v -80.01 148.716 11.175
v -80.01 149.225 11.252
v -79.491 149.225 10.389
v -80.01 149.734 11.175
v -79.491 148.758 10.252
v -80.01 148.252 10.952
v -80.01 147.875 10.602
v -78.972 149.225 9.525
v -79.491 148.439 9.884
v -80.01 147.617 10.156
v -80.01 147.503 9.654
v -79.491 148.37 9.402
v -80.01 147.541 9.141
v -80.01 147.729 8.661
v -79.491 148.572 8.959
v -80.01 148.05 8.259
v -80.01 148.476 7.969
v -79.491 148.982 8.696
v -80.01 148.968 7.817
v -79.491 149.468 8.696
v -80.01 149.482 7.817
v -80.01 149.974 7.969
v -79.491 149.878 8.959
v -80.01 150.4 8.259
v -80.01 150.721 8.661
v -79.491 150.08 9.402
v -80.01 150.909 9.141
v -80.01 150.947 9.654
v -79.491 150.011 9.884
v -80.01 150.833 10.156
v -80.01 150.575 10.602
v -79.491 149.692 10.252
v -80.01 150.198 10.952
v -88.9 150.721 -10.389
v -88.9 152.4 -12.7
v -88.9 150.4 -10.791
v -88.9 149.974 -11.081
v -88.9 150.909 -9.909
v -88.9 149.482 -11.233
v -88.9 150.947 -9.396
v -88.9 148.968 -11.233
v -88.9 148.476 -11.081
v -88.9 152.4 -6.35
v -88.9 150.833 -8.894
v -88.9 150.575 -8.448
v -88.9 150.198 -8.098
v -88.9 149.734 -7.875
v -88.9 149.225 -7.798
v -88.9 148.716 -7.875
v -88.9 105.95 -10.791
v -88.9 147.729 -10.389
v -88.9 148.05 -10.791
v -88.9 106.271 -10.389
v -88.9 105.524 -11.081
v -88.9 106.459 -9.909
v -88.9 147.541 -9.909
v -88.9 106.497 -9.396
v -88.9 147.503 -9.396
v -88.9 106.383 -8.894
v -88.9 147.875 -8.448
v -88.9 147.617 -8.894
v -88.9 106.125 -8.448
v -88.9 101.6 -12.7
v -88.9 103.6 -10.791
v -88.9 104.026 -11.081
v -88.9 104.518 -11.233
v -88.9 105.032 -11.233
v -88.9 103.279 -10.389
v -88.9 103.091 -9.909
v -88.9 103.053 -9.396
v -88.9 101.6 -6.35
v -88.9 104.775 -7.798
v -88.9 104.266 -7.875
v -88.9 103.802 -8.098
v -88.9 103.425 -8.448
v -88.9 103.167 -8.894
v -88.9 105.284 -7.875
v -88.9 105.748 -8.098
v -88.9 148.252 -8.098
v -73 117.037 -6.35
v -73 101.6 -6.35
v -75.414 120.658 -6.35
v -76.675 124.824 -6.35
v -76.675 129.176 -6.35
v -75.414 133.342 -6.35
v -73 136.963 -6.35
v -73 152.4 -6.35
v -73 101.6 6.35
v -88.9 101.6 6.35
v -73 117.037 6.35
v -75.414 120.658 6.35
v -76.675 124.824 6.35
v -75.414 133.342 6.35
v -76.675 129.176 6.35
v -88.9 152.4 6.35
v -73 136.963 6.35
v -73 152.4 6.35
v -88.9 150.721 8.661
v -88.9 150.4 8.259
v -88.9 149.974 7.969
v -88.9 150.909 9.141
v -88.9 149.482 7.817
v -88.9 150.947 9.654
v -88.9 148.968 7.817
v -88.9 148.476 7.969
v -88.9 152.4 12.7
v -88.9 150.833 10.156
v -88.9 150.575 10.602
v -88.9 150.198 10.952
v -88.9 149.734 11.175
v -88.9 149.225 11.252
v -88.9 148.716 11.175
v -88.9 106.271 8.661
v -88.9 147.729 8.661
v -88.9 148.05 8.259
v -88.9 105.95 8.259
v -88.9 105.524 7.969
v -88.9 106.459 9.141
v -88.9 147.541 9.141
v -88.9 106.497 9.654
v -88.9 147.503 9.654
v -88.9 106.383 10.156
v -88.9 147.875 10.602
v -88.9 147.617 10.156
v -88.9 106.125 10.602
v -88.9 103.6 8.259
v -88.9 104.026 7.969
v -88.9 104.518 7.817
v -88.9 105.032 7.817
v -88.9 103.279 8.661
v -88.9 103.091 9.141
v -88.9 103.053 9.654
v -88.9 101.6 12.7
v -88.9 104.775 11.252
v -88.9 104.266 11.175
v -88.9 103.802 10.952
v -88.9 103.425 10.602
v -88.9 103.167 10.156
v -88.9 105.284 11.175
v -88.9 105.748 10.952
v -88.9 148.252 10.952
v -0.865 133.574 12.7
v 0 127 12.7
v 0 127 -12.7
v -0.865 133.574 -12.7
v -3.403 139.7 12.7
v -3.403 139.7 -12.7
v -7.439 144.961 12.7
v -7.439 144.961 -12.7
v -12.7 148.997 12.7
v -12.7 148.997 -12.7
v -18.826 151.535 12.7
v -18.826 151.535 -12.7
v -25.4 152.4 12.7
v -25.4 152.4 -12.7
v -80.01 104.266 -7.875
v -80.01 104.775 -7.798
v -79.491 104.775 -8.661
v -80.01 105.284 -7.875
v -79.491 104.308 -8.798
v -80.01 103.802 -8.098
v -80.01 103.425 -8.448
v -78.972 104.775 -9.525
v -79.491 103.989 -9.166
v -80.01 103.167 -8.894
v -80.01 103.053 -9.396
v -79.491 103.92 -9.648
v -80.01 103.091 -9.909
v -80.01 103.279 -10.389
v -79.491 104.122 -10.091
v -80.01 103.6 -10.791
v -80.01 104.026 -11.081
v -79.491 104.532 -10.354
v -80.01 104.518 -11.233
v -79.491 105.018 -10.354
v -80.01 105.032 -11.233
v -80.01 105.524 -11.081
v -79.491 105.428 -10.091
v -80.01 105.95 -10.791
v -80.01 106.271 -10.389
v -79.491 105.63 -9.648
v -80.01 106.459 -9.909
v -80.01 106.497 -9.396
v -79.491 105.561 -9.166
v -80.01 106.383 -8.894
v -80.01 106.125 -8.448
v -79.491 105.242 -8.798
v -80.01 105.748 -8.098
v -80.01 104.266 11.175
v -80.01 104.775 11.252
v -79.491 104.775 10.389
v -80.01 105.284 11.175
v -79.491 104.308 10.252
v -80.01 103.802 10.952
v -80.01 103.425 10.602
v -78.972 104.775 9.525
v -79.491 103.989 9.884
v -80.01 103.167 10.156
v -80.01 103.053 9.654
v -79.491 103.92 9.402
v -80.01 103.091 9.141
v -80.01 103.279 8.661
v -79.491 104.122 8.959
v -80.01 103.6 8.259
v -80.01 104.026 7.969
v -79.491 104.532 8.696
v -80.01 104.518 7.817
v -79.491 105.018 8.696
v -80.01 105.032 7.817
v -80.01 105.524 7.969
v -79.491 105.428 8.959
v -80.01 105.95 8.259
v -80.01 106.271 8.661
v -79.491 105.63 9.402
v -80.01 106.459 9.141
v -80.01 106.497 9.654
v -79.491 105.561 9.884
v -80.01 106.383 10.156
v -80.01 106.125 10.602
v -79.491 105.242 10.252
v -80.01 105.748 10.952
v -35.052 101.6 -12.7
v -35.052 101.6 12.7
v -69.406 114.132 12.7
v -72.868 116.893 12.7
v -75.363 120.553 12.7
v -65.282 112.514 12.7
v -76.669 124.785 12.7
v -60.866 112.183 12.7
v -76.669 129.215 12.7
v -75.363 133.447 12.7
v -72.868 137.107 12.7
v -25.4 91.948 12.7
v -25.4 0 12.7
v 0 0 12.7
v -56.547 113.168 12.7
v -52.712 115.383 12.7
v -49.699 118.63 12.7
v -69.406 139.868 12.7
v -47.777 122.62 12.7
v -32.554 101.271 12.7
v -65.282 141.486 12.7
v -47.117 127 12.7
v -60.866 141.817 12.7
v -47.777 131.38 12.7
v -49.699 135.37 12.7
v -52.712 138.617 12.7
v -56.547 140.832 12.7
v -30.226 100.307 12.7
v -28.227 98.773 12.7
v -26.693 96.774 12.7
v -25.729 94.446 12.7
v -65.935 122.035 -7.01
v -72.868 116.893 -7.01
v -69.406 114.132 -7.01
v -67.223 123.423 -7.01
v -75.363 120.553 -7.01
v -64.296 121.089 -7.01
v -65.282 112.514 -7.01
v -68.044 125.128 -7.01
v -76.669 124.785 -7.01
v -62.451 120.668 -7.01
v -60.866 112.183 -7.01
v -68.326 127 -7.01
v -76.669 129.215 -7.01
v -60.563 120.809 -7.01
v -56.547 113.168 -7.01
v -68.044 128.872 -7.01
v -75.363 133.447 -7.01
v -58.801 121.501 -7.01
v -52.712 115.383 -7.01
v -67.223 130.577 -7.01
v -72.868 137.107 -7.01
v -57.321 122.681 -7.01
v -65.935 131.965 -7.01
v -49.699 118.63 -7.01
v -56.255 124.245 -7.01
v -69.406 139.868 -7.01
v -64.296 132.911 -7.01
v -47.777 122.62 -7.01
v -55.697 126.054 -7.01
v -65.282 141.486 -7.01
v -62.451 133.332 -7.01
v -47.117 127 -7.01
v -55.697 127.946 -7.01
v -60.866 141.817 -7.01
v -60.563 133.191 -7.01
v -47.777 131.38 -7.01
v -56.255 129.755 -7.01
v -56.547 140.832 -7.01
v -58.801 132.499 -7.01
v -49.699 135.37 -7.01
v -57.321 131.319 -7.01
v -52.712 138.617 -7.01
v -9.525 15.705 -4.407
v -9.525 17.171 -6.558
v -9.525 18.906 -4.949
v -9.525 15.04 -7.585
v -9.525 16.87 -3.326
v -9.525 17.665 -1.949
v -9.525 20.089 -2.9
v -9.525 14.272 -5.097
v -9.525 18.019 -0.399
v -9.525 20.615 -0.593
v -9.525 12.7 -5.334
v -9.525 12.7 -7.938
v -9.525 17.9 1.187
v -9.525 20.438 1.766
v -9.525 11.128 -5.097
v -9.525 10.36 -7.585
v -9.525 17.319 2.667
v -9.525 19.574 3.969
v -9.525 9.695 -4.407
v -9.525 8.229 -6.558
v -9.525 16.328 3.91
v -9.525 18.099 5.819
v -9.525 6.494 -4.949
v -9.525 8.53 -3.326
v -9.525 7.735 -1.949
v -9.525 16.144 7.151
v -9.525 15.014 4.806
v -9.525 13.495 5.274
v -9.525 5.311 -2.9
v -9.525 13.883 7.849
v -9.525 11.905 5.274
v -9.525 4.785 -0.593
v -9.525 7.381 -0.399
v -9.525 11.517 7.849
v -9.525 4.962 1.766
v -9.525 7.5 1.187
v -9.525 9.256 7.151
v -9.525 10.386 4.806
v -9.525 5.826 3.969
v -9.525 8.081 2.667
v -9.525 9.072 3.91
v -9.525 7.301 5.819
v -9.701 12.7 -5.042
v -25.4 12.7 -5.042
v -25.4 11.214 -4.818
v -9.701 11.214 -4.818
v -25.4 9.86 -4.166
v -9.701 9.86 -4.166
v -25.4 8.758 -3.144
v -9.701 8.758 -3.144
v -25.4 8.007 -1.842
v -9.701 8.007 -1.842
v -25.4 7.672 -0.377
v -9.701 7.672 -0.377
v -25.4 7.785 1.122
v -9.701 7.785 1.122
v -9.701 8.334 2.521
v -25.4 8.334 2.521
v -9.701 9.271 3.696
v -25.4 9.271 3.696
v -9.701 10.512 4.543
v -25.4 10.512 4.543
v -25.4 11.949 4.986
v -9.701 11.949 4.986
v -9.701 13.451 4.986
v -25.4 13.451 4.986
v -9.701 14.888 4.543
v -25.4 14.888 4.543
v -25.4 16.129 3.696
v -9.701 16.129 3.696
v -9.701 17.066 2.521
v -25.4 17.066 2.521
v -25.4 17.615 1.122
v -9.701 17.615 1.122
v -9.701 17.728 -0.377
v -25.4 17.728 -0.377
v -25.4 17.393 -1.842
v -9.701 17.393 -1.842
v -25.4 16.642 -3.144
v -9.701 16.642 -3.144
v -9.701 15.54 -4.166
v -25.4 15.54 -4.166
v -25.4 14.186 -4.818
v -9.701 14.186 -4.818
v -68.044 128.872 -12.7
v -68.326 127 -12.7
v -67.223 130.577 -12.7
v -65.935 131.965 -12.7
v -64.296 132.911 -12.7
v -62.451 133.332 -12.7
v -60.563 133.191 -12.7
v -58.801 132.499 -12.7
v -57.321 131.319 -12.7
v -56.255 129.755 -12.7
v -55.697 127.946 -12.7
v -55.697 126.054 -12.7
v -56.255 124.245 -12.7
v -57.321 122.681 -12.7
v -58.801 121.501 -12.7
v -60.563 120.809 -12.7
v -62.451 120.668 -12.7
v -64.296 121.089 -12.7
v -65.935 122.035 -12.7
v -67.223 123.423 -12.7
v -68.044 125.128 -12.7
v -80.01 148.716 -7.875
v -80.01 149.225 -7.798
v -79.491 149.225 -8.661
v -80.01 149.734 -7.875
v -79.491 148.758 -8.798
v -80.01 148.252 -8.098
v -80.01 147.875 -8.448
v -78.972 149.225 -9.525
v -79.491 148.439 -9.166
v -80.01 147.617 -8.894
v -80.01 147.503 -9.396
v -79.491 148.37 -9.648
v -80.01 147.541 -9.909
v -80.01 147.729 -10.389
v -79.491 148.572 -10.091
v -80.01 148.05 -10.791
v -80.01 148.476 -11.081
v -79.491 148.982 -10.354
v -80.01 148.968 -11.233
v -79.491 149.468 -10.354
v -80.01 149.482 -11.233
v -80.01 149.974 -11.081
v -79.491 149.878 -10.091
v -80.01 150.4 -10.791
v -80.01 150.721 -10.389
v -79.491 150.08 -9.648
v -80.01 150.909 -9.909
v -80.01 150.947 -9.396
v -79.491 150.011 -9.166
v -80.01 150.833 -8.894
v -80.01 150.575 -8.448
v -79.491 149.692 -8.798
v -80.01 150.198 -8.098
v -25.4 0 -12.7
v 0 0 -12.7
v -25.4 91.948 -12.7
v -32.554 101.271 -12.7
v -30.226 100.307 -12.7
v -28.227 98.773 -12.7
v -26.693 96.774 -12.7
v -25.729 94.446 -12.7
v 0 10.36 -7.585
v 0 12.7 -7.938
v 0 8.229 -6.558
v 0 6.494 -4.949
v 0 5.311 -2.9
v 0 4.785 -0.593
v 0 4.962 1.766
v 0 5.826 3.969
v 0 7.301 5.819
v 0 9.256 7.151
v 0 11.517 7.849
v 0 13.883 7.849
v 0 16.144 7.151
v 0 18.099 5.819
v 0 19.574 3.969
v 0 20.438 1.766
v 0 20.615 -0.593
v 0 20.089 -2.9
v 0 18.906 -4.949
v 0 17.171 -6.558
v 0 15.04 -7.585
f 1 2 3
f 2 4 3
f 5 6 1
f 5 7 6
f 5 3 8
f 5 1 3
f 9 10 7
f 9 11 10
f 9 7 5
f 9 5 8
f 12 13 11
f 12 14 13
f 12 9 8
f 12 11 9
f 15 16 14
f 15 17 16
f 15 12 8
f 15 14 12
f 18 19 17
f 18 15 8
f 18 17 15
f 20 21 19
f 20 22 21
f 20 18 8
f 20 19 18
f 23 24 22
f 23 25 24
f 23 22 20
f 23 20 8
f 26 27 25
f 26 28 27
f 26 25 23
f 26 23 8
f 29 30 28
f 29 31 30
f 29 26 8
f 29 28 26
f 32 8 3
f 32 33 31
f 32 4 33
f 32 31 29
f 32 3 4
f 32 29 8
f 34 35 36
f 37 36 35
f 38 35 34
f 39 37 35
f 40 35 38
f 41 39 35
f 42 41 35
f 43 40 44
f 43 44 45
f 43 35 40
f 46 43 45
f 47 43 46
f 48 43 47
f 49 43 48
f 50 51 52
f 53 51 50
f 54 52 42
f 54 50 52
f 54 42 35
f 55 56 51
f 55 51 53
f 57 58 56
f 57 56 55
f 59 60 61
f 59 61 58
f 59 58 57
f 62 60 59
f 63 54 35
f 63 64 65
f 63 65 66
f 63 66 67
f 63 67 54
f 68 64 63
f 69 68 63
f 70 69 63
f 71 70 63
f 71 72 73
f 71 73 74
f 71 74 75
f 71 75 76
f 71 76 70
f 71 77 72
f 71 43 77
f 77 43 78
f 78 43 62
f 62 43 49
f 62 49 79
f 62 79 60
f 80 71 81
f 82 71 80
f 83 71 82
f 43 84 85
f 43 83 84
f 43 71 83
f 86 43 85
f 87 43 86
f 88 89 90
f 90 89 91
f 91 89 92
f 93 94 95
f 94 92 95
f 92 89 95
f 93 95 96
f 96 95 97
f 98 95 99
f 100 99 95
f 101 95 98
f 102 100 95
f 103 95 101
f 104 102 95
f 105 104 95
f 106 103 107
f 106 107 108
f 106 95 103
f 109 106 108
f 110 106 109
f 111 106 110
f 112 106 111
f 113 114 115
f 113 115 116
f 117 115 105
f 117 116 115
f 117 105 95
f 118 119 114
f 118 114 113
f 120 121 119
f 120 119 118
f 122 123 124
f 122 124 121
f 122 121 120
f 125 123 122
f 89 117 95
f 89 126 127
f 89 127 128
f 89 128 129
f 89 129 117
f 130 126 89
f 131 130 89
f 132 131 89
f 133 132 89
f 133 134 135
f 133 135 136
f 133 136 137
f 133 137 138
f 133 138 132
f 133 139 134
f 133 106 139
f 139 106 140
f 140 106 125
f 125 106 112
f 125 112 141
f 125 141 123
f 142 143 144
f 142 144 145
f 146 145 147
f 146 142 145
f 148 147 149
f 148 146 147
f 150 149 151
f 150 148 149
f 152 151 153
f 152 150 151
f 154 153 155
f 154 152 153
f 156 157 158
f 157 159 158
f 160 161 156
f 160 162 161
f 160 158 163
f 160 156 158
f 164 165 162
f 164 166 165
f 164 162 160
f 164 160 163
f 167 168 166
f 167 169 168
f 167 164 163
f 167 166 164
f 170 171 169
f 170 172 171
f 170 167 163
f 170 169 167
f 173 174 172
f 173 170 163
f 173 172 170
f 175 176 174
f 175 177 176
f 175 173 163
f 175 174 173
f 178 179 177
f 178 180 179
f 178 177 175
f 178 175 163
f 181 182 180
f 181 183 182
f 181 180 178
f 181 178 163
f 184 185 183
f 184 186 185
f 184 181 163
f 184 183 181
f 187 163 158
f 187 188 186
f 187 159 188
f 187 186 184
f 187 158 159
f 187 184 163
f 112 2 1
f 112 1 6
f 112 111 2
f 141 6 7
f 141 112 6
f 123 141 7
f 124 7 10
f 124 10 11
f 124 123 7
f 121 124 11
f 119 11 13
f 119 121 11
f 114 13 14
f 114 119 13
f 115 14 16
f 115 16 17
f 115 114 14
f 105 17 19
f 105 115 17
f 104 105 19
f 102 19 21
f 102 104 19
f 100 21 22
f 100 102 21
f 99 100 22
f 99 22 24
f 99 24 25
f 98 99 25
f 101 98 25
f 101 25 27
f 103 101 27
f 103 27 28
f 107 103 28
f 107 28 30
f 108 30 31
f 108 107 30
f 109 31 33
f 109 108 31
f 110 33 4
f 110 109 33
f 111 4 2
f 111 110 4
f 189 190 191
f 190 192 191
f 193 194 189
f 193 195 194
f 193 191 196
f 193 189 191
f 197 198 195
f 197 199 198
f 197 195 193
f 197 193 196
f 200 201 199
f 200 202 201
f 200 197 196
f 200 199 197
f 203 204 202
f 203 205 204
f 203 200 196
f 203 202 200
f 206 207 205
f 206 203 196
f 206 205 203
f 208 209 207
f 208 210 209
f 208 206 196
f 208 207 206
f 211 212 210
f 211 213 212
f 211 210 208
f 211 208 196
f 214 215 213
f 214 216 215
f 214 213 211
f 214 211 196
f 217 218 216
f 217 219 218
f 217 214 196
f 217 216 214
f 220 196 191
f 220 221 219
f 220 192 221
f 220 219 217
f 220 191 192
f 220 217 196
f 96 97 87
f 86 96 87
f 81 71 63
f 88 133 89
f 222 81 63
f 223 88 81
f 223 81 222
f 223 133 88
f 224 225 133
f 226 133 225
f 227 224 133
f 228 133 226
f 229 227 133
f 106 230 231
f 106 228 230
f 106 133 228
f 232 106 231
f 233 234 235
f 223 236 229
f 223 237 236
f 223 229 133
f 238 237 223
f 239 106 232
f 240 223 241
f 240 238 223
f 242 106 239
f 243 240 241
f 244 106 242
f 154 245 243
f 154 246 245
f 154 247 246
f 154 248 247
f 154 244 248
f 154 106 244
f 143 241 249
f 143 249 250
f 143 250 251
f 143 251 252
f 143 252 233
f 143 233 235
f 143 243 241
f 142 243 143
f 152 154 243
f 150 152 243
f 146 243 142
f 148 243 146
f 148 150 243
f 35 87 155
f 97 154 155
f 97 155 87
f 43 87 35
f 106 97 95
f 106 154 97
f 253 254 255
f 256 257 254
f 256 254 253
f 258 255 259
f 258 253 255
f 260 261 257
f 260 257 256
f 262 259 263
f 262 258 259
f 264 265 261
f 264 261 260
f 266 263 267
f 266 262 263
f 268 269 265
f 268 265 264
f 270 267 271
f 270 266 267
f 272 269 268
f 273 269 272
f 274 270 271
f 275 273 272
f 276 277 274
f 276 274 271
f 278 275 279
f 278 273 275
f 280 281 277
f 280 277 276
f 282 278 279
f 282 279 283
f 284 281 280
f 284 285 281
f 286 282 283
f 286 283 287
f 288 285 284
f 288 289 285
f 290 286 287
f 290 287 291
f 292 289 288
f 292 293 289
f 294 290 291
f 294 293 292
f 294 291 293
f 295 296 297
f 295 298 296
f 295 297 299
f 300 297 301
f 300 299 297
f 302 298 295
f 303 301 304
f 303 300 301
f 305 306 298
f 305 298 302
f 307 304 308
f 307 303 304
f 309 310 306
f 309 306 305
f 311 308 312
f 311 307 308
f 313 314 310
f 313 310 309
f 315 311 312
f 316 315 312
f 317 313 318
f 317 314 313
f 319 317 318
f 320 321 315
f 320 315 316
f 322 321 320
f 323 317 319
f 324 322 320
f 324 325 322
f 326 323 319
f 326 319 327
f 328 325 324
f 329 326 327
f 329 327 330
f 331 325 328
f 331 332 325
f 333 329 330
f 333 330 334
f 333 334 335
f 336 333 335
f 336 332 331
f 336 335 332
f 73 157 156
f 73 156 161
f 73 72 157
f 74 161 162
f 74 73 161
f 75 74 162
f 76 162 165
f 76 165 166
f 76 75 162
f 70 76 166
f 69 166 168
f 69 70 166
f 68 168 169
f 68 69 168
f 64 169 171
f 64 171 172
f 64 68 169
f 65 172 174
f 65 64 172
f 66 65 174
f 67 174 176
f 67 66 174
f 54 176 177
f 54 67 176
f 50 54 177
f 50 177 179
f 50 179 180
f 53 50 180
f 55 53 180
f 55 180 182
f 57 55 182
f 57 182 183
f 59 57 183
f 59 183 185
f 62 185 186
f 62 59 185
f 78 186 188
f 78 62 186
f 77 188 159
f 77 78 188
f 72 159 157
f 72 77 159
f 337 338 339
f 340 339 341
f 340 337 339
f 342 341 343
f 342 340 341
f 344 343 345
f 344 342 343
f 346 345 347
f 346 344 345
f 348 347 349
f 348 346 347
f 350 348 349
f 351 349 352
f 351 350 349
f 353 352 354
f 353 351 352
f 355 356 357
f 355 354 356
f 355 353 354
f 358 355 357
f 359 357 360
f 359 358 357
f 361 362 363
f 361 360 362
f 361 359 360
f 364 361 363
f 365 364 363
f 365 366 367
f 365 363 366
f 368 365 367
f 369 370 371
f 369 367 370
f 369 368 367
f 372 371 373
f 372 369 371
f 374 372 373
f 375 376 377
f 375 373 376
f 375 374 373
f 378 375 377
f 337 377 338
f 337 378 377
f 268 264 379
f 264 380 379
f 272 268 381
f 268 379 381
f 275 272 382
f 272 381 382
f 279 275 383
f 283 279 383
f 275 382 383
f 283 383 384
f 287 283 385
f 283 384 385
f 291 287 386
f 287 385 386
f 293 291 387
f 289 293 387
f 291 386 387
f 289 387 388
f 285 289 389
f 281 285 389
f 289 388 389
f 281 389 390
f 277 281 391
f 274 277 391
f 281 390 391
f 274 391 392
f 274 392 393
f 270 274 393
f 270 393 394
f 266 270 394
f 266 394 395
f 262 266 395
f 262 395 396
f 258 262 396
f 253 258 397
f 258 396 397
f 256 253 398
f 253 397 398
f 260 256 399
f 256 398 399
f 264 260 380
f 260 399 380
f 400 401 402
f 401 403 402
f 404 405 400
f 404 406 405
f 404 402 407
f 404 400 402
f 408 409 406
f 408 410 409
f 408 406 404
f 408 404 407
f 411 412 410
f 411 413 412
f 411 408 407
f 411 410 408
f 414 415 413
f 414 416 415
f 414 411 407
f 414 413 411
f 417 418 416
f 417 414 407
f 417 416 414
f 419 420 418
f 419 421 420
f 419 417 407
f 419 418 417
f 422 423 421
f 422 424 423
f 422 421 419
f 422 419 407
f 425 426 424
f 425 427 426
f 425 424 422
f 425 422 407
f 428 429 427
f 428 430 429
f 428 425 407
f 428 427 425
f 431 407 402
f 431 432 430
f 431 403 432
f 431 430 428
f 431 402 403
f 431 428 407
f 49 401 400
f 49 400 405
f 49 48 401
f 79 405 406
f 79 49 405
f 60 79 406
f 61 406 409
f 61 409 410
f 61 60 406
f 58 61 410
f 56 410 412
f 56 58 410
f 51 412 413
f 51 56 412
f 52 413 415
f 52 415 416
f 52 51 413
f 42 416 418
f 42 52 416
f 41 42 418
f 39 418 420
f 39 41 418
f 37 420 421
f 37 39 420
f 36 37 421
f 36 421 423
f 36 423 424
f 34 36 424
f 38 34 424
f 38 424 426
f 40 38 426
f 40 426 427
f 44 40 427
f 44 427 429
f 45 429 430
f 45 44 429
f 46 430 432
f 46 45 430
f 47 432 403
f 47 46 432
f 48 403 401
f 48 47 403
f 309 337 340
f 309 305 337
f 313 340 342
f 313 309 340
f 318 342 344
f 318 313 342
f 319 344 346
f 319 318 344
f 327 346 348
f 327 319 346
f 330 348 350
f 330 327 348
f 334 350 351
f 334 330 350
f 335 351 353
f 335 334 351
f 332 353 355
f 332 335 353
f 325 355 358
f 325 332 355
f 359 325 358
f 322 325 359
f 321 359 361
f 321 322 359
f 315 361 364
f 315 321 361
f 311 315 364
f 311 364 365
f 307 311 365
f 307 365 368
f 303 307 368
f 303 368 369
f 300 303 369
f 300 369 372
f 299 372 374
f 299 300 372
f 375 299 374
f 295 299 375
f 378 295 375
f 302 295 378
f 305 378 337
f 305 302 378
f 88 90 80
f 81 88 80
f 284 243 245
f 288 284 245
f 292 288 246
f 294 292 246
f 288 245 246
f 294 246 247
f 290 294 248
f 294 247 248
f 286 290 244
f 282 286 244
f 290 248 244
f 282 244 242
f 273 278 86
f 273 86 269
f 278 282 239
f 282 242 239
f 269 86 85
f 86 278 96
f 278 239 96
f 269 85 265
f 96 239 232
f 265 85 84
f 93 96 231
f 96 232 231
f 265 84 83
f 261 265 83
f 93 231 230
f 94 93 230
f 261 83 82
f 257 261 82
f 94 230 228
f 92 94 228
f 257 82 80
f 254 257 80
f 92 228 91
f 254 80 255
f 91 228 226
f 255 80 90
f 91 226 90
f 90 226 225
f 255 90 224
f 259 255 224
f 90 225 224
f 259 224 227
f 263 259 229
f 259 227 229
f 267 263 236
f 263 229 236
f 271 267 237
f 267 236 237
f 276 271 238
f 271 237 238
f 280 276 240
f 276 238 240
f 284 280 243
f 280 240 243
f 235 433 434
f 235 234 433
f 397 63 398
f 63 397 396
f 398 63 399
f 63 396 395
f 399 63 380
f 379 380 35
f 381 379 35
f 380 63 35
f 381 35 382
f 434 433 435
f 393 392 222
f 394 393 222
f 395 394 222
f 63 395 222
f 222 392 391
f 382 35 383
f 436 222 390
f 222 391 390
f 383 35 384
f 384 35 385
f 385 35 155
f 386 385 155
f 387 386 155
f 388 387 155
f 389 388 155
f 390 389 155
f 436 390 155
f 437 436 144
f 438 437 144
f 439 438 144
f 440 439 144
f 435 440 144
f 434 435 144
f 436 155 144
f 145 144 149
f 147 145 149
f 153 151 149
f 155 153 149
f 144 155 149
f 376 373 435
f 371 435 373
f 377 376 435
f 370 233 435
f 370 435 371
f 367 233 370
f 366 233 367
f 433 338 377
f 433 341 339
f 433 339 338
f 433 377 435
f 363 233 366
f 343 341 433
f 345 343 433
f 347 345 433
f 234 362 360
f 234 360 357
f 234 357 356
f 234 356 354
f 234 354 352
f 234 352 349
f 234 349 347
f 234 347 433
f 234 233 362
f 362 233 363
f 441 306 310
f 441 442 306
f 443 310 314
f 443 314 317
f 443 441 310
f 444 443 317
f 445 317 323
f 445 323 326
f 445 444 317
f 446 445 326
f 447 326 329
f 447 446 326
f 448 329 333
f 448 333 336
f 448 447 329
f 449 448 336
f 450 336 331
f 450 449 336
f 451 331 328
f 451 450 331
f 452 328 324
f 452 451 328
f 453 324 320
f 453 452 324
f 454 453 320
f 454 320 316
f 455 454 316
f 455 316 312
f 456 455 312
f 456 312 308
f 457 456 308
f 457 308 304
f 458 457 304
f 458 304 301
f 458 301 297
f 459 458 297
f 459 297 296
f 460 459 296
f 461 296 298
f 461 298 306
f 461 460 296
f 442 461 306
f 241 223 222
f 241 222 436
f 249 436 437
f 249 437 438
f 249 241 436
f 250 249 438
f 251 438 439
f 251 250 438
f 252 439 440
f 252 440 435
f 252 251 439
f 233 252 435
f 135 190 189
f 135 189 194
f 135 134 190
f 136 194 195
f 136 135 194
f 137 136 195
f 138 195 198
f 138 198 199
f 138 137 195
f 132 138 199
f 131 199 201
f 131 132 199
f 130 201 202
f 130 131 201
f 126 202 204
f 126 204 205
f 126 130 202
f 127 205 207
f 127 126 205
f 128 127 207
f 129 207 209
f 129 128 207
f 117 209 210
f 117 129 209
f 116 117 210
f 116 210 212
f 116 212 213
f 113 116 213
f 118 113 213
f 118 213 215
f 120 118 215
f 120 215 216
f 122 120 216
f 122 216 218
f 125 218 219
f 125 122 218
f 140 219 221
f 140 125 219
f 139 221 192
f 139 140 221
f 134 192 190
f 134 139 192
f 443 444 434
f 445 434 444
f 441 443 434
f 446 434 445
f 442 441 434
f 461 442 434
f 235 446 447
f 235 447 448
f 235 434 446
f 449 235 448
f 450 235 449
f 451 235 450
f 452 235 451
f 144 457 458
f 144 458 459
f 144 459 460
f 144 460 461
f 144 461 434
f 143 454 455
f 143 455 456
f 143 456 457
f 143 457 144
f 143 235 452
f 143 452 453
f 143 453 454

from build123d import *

# Parameters (mm, degrees)
BOSS_EXTRUDE1_DEPTH                                 = 12.7
SKETCH2_W                                           = 15.9004
SKETCH2_H                                           = 12.7
CUT_EXTRUDE1_DEPTH                                  = 1
CUT_EXTRUDE1_DEPTH_BACK                             = 153.4
CBORE_FOR_00_BINDING_HEAD_MACHINE_SCREW_D           = 12.7
CBORE_FOR_00_BINDING_HEAD_MACHINE_SCREW_CBORE_D     = 29.718
CBORE_FOR_00_BINDING_HEAD_MACHINE_SCREW_CBORE_DEPTH = 19.7104
LPATTERN1_COUNT                                     = 2
LPATTERN1_PITCH                                     = 44.45
LPATTERN1_COUNT_DIR2                                = 2
LPATTERN1_PITCH_DIR2                                = 19.05


with BuildPart() as part:
    # Sketch1 → Boss-Extrude1 (new body, symmetric)
    with BuildSketch(Plane.XY):
        with BuildLine():
            Line((0, 0), (0, 127))
            ThreePointArc((0, 127), (-7.439487758, 144.960512242), (-25.4, 152.4))
            Line((-25.4, 152.4), (-88.9, 152.4))
            Line((-88.9, 152.4), (-88.9, 101.6))
            Line((-88.9, 101.6), (-35.052, 101.6))
            ThreePointArc((-35.052, 101.6), (-28.227005348, 98.772994652), (-25.4, 91.948))
            Line((-25.4, 91.948), (-25.4, 0))
            Line((-25.4, 0), (0, 0))
        make_face()
    extrude(amount=BOSS_EXTRUDE1_DEPTH, both=True)

    # Sketch2 → Cut-Extrude1 (cut, two sides)
    with BuildSketch(Plane(origin=(0, 152.4, 0), x_dir=(1, 0, 0), z_dir=(0, 1, 0))) as cut_extrude1_sk:
        with Locations((-80.9498, 0)):
            Rectangle(SKETCH2_W, SKETCH2_H)
    extrude(amount=CUT_EXTRUDE1_DEPTH, mode=Mode.SUBTRACT)
    extrude(cut_extrude1_sk.sketch, amount=-CUT_EXTRUDE1_DEPTH_BACK, mode=Mode.SUBTRACT)

    # CBORE for #00 Binding Head Machine Screw1 (through all)
    with Locations(Plane.XY.offset(12.7)):
        with Locations((-61.976, 127)):
            CounterBoreHole(CBORE_FOR_00_BINDING_HEAD_MACHINE_SCREW_D / 2, CBORE_FOR_00_BINDING_HEAD_MACHINE_SCREW_CBORE_D / 2, CBORE_FOR_00_BINDING_HEAD_MACHINE_SCREW_CBORE_DEPTH)

    # Sketch7 → CBORE for 3/8 Socket Head Cap Screw1 (revolve, cut)
    with BuildSketch(Plane(origin=(0, 12.7, 0), x_dir=(0, 0, -1), z_dir=(0, 1, 0))):
        Polygon((0, 0), (0, 88.9), (5.0419, 88.9), (5.0419, 9.700511387), (5.334, 9.525), (7.9375, 9.525), (7.9375, 0), align=None)
    revolve(axis=Axis((6.35, 12.7, 0), (-1, 0, 0)), mode=Mode.SUBTRACT)

    # Sketch9 → #8-32 Tapped Hole1 (revolve, cut)
    with BuildSketch(Plane(origin=(-88.9, 104.775, -9.525), x_dir=(0, 0, 1), z_dir=(0, 1, 0))):
        Polygon((0, 0), (0, 9.927806461), (1.7272, 8.89), (1.7272, 0), align=None)
    f_8_32_tapped_hole1 = revolve(axis=Axis((-95.25, 104.775, -9.525), (1, 0, 0)), mode=Mode.SUBTRACT)

    # LPattern1: 8-32 Tapped Hole1 2 × 2
    with Locations(*[(0, i * LPATTERN1_PITCH, j * LPATTERN1_PITCH_DIR2) for i in range(LPATTERN1_COUNT) for j in range(LPATTERN1_COUNT_DIR2) if (i, j) != (0, 0)]):
        add(f_8_32_tapped_hole1, mode=Mode.SUBTRACT)


solid = part.part
